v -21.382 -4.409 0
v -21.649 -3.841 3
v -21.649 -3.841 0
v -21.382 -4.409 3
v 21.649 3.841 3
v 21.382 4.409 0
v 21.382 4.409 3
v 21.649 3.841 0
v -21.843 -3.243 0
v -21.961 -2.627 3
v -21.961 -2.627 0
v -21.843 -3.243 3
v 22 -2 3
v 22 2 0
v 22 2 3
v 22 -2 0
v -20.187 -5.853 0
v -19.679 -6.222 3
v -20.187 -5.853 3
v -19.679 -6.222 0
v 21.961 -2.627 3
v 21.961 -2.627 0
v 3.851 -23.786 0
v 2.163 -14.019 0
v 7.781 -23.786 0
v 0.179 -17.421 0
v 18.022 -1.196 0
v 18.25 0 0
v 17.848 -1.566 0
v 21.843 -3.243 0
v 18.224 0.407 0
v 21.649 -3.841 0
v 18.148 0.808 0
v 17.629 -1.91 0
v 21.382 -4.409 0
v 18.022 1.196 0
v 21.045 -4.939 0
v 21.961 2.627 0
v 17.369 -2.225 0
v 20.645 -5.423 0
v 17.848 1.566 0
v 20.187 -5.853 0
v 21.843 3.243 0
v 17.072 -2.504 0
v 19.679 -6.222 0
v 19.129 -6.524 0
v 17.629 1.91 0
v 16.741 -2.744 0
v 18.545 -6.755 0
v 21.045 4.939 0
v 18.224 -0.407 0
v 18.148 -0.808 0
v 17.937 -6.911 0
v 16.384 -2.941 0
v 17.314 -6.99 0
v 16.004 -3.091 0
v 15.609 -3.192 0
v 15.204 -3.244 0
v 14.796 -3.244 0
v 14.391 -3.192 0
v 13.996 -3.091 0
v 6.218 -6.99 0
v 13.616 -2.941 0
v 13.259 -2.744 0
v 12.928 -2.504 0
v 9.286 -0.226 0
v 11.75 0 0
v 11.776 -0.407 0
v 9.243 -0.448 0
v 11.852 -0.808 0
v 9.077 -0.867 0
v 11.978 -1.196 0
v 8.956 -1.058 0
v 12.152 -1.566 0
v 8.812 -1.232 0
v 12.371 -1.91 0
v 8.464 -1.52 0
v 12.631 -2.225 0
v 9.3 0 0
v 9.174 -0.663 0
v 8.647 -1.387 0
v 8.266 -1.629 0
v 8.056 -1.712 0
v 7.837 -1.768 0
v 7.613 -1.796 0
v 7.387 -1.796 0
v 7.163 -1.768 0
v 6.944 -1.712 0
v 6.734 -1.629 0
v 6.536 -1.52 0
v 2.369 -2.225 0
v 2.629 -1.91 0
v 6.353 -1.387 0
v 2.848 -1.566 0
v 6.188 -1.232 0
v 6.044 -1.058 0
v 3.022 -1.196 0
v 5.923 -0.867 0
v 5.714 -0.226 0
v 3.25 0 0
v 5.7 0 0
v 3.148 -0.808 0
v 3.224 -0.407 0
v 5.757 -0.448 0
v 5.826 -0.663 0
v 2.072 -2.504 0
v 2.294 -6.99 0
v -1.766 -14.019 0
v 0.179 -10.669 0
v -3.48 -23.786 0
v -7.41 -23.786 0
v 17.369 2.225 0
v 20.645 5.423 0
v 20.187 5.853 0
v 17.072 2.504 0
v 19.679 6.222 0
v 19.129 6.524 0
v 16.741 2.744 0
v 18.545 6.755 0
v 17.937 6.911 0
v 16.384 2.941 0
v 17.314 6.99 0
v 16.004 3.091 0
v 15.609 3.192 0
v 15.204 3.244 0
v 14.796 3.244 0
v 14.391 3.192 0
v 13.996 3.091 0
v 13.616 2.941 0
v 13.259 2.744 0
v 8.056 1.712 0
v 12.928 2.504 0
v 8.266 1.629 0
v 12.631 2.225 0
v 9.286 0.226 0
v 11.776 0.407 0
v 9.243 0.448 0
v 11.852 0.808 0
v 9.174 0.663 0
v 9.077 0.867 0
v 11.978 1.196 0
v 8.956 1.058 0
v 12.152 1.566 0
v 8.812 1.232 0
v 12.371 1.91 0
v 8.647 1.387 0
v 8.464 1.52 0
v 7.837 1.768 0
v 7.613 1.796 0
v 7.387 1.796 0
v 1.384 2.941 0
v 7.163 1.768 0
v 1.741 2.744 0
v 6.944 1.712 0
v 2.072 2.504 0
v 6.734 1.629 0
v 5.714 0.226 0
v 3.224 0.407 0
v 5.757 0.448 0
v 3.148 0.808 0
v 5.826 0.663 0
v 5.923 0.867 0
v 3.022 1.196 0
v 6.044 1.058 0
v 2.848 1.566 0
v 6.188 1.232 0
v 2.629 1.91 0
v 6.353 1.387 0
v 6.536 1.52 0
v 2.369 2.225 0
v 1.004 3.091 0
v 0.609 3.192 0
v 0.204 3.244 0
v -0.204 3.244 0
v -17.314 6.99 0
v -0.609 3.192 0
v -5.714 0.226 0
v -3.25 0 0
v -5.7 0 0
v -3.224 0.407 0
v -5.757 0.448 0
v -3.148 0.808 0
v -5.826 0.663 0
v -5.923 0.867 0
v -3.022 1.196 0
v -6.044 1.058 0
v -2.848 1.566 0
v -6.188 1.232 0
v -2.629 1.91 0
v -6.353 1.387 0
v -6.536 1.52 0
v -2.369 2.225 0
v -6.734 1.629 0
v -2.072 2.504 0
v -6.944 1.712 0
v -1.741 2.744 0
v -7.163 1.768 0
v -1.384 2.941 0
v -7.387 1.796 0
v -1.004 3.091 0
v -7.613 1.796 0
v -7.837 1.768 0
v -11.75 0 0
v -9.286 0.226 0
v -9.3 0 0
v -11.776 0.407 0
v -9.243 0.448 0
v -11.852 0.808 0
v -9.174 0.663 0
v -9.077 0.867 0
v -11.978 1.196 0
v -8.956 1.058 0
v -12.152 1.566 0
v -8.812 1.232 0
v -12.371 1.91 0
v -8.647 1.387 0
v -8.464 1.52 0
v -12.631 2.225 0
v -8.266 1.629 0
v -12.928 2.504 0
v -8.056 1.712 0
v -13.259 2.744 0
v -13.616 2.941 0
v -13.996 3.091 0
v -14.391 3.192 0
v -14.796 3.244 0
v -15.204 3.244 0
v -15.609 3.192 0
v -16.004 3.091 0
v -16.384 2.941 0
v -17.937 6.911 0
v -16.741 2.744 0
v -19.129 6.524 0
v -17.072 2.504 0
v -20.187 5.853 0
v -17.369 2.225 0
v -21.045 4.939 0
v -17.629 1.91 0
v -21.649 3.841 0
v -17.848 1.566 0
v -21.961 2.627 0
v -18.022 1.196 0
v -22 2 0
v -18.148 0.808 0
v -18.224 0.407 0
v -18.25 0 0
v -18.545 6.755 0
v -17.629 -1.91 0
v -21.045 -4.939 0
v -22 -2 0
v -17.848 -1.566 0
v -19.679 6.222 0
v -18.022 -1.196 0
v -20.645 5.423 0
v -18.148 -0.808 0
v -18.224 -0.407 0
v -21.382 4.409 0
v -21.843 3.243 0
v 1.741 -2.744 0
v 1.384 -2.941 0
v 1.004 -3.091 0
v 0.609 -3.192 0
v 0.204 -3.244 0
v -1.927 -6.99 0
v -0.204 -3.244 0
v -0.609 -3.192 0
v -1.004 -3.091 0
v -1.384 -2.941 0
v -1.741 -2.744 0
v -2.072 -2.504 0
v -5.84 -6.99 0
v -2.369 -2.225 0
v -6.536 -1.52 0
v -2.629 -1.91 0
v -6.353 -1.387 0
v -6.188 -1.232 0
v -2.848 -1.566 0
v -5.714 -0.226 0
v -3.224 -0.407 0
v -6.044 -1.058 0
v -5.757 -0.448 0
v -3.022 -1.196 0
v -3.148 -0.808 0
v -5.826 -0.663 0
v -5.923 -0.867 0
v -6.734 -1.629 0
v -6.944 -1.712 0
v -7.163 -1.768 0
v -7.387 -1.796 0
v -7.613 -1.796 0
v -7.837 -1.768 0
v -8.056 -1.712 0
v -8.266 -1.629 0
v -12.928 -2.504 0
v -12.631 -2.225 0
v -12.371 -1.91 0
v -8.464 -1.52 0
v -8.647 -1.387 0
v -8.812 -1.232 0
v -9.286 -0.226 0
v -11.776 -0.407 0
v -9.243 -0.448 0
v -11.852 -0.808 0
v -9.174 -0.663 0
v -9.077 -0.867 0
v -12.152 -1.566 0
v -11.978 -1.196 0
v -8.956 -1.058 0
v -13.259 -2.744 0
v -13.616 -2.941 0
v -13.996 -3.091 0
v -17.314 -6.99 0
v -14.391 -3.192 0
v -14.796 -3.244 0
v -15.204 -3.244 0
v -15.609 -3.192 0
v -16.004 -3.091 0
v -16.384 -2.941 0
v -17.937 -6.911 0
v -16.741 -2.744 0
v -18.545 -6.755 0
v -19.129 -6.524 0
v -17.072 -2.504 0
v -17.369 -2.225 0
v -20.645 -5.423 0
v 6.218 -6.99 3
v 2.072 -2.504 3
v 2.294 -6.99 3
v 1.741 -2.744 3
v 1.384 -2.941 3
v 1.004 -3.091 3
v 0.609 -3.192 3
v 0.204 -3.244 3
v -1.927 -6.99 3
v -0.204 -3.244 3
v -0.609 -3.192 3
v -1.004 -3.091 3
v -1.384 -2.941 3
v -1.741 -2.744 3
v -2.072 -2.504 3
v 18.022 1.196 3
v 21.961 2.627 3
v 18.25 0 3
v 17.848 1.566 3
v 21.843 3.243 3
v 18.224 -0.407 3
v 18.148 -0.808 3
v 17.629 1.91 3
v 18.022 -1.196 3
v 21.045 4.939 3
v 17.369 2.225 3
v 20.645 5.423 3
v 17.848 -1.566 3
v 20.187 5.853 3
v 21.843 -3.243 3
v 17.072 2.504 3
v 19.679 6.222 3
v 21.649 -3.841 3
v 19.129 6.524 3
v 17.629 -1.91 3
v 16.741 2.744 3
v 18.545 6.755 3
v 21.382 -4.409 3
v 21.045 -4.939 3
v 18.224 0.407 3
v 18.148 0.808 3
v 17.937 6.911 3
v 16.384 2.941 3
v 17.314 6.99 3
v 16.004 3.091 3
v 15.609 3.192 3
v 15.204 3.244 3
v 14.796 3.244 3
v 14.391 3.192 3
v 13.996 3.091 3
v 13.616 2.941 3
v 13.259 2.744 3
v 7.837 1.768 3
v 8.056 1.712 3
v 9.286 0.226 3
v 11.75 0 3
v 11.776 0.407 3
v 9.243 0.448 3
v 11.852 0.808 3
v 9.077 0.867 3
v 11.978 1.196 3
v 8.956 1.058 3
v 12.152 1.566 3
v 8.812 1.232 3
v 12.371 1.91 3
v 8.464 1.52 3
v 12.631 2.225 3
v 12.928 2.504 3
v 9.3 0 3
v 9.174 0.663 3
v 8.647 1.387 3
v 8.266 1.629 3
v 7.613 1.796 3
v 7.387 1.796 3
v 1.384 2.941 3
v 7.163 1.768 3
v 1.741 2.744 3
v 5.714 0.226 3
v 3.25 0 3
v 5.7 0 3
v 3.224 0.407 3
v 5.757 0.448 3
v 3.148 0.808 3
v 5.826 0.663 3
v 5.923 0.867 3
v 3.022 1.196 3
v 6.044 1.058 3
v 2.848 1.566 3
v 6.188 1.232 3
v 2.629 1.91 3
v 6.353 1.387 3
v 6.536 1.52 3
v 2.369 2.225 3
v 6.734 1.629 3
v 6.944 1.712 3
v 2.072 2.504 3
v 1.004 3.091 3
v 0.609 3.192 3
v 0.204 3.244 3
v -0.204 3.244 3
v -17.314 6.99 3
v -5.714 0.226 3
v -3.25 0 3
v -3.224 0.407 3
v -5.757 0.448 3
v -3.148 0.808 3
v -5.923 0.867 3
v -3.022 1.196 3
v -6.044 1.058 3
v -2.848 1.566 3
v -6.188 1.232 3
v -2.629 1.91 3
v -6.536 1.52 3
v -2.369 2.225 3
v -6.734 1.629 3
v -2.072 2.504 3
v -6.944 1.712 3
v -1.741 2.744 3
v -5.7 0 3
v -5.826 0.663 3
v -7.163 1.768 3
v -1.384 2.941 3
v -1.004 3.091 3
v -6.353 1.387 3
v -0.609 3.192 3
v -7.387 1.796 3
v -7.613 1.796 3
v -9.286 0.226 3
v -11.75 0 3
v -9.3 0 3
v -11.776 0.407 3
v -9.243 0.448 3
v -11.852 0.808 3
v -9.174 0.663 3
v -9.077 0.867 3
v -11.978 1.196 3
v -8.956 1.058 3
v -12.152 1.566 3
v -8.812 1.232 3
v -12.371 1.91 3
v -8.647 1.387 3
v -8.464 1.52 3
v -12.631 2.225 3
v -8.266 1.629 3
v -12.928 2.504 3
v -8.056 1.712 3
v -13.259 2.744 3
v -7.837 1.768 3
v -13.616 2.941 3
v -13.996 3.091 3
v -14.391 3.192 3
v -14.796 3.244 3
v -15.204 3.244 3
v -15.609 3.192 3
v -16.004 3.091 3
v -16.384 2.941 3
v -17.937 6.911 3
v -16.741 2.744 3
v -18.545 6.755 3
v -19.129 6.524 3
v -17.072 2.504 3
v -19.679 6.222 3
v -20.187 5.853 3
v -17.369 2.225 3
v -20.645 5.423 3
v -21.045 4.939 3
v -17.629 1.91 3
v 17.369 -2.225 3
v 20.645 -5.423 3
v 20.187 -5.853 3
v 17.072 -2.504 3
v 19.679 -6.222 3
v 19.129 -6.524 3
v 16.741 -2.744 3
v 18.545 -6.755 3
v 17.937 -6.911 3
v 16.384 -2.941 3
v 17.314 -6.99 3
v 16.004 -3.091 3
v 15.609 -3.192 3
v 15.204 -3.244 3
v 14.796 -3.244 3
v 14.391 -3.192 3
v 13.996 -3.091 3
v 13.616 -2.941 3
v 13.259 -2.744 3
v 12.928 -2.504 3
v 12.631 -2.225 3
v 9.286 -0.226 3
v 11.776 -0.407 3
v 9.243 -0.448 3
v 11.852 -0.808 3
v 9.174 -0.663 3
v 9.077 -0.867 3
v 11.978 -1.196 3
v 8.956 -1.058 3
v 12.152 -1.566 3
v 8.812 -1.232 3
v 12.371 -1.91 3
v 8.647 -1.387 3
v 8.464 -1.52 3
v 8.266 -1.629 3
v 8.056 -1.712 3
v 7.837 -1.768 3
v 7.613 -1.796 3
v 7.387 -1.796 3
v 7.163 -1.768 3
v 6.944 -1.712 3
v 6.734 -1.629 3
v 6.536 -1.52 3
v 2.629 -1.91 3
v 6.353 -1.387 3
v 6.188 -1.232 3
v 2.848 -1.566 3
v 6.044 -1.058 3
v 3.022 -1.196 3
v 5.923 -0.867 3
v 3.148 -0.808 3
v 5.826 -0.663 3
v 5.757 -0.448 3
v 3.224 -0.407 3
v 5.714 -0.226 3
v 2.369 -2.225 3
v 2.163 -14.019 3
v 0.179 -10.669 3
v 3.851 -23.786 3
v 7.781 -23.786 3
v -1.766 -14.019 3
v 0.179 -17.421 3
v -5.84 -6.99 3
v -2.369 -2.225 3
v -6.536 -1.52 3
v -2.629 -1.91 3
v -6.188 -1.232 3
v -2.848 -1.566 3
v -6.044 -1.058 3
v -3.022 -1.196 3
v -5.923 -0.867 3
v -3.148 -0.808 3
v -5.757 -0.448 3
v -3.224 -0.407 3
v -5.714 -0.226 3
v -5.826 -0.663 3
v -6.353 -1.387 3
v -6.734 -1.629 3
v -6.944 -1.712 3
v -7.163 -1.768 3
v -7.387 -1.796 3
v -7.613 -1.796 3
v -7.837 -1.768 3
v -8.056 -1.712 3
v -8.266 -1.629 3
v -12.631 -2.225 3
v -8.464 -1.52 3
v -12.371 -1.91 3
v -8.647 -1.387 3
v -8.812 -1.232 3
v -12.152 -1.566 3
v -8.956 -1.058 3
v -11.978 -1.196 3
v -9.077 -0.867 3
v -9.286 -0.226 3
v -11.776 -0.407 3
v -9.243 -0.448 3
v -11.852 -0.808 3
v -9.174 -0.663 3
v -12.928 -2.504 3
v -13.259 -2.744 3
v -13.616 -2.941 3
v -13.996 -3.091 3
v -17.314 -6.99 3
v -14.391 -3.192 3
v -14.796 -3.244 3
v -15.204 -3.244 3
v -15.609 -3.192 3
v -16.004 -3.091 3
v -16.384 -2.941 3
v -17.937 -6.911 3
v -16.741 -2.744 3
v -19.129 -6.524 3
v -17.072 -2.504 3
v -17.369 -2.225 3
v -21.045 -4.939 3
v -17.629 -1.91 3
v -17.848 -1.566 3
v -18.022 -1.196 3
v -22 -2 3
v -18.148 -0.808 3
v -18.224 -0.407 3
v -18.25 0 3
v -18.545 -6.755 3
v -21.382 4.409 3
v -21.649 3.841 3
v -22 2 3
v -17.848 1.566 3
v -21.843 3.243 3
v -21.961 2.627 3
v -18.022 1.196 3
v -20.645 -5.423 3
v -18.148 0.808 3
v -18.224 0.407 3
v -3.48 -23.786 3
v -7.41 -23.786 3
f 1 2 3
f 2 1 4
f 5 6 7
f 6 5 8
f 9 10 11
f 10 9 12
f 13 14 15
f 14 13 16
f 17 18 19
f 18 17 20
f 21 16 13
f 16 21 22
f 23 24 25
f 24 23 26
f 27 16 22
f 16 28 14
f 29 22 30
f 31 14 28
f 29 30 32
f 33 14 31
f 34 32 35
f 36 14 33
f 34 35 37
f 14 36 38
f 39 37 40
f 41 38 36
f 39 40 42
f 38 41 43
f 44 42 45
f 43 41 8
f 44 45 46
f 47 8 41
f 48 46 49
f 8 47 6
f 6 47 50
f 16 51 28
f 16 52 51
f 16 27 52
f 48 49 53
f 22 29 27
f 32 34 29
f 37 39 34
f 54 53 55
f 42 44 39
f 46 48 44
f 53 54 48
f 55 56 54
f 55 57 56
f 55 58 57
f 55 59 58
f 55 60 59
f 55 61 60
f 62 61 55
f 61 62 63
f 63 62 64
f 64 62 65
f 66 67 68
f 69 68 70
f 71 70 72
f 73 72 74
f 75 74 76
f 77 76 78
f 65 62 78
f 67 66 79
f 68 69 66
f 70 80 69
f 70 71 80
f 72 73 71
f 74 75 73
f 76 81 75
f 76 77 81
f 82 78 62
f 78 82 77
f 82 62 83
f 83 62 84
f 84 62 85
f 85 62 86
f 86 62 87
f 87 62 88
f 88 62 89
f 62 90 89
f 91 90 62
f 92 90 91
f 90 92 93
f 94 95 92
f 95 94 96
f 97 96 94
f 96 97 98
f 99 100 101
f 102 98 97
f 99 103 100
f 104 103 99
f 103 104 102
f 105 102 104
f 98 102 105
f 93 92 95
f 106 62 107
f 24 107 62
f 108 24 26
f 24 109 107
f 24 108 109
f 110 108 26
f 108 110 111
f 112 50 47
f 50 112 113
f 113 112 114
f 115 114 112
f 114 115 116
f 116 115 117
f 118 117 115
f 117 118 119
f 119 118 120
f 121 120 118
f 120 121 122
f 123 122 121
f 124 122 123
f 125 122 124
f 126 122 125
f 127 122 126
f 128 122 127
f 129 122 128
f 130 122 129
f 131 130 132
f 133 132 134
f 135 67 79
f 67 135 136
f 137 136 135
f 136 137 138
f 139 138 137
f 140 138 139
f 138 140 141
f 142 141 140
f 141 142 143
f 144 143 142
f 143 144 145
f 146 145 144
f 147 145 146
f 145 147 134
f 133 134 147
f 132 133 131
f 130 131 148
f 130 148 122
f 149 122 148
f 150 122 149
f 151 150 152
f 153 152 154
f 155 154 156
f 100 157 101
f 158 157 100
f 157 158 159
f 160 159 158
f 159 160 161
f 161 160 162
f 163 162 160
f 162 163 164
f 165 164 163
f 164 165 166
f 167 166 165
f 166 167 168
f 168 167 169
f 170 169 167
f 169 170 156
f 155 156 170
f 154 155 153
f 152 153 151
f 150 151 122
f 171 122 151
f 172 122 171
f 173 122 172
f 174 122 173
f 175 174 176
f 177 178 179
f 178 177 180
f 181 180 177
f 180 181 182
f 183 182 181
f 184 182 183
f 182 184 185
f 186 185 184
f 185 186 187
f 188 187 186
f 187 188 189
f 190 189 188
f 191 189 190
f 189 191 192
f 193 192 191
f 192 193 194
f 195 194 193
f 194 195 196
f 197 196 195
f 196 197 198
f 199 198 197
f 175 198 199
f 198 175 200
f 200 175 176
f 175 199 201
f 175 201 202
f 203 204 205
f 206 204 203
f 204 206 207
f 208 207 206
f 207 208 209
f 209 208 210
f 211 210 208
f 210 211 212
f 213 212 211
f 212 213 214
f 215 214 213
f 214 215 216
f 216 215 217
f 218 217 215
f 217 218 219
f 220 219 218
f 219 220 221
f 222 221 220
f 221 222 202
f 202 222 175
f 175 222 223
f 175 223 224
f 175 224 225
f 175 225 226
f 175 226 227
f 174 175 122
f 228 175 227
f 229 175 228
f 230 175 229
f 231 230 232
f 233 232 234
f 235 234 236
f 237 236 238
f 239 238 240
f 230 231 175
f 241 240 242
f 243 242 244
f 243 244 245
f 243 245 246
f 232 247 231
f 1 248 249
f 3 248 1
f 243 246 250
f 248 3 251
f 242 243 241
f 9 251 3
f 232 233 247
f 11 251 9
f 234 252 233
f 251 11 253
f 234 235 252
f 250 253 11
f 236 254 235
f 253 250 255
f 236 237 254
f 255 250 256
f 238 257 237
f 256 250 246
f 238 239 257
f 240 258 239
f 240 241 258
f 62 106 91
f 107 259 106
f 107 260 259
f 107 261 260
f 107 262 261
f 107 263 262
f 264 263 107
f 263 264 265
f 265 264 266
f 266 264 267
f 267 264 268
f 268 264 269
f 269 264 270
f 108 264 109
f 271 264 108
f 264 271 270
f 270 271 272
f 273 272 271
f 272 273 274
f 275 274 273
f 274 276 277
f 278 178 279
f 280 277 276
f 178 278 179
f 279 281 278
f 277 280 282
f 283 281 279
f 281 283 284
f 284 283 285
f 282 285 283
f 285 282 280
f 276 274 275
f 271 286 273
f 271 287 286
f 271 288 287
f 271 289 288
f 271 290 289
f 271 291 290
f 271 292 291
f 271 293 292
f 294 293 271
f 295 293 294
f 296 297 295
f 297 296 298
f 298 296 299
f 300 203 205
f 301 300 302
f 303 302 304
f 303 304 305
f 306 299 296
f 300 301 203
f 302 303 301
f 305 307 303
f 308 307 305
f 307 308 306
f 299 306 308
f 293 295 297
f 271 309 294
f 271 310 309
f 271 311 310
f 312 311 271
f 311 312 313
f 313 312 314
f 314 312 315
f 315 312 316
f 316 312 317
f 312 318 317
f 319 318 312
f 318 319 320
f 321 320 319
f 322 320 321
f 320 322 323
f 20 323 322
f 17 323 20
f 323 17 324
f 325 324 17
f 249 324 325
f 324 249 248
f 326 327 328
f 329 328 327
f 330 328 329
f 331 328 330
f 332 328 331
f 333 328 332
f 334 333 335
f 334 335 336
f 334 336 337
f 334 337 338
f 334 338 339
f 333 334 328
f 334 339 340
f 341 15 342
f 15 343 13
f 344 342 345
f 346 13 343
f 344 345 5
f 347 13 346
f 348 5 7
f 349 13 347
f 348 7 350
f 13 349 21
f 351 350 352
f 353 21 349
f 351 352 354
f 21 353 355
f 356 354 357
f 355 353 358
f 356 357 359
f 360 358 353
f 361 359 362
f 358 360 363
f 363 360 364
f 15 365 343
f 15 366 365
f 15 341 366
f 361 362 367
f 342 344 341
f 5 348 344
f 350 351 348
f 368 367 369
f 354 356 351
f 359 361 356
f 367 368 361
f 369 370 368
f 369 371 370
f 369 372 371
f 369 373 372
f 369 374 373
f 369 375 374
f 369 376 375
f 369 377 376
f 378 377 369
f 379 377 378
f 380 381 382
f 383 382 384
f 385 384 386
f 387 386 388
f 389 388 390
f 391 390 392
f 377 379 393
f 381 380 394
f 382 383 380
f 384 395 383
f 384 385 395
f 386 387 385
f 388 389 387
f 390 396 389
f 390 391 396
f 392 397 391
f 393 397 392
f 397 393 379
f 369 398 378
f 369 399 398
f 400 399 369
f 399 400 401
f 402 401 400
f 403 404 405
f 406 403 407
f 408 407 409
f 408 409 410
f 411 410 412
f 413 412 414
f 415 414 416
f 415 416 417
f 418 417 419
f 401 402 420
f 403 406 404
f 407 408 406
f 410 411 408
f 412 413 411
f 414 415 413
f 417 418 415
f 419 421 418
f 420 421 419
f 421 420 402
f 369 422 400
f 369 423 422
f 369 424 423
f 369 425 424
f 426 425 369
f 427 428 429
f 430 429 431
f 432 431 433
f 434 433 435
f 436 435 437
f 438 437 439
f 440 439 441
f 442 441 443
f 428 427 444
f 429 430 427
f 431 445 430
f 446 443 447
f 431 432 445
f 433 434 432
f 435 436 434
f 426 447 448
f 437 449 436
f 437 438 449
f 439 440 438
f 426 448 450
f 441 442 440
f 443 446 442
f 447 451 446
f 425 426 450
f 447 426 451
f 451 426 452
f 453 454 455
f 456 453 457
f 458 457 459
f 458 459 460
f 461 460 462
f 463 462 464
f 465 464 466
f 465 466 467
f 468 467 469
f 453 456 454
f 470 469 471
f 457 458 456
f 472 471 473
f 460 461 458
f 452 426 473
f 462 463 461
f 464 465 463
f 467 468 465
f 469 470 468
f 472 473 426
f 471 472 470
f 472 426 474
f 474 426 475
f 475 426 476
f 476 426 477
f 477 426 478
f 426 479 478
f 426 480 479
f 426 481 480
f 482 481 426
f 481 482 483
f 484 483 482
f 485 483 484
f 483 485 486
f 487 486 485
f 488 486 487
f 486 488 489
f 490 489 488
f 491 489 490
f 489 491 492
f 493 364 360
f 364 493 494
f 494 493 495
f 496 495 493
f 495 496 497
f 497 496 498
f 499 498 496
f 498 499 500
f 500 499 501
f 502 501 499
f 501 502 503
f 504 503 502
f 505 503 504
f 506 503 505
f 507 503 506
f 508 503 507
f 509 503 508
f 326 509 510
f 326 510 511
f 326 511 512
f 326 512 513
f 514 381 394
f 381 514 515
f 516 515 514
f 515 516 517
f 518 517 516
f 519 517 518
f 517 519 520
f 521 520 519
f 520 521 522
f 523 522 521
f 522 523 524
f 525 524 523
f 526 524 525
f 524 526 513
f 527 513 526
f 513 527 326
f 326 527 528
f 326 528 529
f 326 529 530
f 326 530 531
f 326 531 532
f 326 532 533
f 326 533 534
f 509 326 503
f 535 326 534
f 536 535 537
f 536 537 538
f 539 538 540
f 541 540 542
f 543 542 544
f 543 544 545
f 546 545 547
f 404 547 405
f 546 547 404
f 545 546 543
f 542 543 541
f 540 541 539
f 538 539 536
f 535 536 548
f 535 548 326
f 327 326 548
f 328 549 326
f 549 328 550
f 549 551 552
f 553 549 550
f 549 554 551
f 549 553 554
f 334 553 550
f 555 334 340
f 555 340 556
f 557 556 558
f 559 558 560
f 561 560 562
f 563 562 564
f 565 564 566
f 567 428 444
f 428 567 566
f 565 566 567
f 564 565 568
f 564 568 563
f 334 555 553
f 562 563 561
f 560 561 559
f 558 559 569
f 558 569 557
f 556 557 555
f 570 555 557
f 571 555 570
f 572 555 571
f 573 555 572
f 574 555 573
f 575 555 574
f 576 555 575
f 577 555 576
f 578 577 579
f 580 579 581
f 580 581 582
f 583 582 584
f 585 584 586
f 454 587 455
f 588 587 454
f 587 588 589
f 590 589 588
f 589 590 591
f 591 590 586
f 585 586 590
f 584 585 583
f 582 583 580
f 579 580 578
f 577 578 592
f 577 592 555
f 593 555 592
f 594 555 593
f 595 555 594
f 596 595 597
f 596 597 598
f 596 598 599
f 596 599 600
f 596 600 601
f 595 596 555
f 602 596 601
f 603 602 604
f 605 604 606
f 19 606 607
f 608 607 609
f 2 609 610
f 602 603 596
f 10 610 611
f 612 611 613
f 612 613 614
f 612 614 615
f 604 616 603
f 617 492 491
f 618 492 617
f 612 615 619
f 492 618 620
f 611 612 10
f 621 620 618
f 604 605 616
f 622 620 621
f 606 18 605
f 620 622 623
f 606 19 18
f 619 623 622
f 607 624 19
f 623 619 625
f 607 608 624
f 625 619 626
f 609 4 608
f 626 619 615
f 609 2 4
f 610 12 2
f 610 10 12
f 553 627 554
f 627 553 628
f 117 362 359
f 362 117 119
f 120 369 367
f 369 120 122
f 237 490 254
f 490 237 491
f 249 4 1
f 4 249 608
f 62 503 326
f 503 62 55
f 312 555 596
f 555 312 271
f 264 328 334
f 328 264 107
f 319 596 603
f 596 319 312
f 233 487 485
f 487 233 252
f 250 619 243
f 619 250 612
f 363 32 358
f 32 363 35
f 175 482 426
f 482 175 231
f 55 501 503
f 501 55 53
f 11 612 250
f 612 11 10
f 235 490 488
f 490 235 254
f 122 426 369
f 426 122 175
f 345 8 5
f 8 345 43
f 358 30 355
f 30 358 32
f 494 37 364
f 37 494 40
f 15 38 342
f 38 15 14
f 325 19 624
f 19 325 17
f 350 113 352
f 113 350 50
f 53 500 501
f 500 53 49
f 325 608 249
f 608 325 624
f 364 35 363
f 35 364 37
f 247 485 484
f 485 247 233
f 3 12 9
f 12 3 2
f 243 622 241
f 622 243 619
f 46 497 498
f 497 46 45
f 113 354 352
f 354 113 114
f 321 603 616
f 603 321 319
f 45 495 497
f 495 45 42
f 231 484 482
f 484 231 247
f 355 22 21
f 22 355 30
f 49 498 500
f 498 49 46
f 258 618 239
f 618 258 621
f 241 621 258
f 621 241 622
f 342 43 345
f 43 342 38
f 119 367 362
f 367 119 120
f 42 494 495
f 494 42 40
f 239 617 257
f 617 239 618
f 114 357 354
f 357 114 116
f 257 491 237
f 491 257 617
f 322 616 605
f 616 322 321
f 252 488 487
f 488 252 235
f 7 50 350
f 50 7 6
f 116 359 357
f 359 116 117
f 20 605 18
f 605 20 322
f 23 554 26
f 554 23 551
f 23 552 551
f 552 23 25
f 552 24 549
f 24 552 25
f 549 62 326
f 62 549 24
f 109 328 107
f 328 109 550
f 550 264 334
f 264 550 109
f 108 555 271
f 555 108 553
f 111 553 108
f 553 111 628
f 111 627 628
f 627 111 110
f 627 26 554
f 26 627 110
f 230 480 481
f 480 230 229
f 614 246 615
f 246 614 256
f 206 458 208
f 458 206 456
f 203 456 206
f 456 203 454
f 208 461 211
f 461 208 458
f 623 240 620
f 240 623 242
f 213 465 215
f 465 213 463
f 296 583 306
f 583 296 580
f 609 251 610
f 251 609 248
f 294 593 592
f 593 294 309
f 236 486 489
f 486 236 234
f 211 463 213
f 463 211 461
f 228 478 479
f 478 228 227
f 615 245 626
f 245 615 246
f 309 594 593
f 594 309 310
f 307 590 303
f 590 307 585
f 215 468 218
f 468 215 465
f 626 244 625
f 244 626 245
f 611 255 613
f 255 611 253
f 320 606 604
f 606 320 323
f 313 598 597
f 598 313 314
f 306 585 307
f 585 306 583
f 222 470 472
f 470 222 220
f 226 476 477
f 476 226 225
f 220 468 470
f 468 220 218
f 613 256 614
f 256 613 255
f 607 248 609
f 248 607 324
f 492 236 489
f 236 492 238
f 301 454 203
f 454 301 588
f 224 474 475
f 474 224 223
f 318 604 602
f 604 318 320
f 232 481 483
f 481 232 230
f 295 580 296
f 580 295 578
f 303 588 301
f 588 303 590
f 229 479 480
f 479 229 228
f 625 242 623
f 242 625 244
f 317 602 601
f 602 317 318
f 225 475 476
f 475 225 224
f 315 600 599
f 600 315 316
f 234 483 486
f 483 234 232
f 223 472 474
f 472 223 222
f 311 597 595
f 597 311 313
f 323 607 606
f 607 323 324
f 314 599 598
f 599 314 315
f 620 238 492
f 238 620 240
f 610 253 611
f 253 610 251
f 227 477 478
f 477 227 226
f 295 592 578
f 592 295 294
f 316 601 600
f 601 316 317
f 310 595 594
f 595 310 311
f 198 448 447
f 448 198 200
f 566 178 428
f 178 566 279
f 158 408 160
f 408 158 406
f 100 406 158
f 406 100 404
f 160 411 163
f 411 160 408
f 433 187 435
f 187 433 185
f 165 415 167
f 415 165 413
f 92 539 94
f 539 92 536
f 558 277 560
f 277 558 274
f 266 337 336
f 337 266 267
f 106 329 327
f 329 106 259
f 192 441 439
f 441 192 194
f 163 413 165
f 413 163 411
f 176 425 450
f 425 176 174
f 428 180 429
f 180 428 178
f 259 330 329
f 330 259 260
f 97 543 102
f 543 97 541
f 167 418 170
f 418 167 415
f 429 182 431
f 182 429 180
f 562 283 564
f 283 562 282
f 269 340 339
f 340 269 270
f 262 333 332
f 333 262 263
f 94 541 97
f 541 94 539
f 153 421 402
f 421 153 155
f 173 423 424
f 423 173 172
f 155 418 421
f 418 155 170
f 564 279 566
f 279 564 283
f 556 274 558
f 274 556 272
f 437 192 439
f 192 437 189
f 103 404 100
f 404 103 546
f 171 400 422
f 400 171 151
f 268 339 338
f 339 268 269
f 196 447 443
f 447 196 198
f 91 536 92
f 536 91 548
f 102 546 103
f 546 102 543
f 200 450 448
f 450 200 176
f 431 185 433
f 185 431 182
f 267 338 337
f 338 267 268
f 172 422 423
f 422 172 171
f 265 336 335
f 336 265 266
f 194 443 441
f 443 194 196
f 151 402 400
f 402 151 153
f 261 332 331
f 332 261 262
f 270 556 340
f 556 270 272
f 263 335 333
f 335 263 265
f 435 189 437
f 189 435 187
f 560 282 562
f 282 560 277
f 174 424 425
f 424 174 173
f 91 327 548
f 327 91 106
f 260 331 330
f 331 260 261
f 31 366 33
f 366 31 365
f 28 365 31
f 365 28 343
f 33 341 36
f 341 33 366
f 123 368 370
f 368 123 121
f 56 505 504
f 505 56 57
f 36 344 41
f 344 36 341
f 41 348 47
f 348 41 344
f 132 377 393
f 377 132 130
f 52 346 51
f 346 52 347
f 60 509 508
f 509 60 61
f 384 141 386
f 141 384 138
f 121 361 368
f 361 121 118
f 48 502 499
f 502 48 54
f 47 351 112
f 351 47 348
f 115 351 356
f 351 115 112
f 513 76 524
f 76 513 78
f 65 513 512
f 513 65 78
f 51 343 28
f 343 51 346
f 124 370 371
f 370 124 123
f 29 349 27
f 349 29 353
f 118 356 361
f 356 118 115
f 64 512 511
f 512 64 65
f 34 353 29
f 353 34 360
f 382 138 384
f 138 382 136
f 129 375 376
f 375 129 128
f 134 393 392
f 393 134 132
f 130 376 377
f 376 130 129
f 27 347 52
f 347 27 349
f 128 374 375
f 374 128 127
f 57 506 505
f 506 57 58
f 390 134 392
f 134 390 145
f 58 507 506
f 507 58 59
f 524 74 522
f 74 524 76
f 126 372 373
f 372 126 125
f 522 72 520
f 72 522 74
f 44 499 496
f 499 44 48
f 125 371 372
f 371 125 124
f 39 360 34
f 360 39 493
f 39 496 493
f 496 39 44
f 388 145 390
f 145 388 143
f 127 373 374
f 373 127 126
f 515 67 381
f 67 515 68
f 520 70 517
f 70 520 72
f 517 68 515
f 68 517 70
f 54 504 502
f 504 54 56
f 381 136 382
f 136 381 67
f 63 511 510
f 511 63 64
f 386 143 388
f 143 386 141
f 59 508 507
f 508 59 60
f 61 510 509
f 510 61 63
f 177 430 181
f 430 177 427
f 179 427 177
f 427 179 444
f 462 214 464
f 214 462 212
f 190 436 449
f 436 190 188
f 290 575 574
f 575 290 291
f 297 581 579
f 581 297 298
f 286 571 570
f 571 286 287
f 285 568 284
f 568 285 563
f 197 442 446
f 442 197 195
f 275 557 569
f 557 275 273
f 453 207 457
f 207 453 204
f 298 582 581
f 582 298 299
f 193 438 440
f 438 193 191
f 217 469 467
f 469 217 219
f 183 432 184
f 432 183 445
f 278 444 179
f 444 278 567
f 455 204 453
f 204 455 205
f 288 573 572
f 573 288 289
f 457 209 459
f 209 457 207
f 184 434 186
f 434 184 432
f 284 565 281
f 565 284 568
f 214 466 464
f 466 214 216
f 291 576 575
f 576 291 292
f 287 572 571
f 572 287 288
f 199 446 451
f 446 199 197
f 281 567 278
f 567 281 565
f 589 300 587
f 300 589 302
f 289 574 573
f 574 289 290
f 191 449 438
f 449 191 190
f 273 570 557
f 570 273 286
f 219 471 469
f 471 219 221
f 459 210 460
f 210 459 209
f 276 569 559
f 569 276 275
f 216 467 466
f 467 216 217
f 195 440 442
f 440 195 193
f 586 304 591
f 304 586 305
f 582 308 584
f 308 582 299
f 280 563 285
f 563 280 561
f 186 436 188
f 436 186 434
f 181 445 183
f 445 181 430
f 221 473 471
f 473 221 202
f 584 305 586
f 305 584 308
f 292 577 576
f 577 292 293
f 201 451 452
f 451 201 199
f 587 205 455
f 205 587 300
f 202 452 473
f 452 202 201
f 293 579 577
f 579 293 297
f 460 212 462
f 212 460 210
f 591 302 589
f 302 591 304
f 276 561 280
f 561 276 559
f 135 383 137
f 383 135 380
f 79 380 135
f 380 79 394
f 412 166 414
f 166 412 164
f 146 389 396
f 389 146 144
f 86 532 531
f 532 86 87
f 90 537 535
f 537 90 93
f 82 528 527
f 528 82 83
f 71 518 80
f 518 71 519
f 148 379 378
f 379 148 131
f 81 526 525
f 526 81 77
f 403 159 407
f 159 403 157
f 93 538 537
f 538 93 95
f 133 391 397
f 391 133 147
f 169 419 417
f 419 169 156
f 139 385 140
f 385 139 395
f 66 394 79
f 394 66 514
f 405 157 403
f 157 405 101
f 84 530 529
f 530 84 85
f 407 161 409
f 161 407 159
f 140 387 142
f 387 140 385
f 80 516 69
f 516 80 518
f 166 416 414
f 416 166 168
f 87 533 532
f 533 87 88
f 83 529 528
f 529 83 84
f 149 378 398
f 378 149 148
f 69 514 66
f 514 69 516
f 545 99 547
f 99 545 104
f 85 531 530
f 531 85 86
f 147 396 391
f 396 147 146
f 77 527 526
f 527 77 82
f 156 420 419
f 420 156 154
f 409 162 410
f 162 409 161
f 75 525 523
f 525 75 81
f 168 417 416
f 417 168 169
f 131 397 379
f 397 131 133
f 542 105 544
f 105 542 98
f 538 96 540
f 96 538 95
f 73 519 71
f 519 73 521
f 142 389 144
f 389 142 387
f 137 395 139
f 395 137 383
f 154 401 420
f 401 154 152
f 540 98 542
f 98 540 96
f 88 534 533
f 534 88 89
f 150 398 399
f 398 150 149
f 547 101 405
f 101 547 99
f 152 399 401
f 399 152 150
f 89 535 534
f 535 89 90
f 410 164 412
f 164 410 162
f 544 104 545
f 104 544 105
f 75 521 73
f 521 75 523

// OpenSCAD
$fn = 50;


difference() {
	union() {
		hull() {
			translate(v = [-17.0000000000, 2.0000000000, 0]) {
				cylinder(h = 3, r = 5);
			}
			translate(v = [17.0000000000, 2.0000000000, 0]) {
				cylinder(h = 3, r = 5);
			}
			translate(v = [-17.0000000000, -2.0000000000, 0]) {
				cylinder(h = 3, r = 5);
			}
			translate(v = [17.0000000000, -2.0000000000, 0]) {
				cylinder(h = 3, r = 5);
			}
		}
		translate(v = [0, -5, 0]) {
			linear_extrude(height = 3) {
				text(font = "DejaVu Sans Mono:style=Bold", halign = "center", size = 19.0000000000, text = "X", valign = "top");
			}
		}
	}
	union() {
		translate(v = [-15.0000000000, 0.0000000000, 0]) {
			translate(v = [0, 0, -100]) {
				cylinder(h = 200, r = 3.2500000000);
			}
		}
		translate(v = [0, 0, -100]) {
			cylinder(h = 200, r = 3.2500000000);
		}
		translate(v = [15.0000000000, 0.0000000000, 0]) {
			translate(v = [0, 0, -100]) {
				cylinder(h = 200, r = 3.2500000000);
			}
		}
		translate(v = [-15.0000000000, 0.0000000000, 0]) {
			translate(v = [0, 0, -100]) {
				cylinder(h = 200, r = 1.8000000000);
			}
		}
		translate(v = [-7.5000000000, 0.0000000000, 0]) {
			translate(v = [0, 0, -100]) {
				cylinder(h = 200, r = 1.8000000000);
			}
		}
		translate(v = [0, 0, -100]) {
			cylinder(h = 200, r = 1.8000000000);
		}
		translate(v = [7.5000000000, 0.0000000000, 0]) {
			translate(v = [0, 0, -100]) {
				cylinder(h = 200, r = 1.8000000000);
			}
		}
		translate(v = [15.0000000000, 0.0000000000, 0]) {
			translate(v = [0, 0, -100]) {
				cylinder(h = 200, r = 1.8000000000);
			}
		}
	}
}
